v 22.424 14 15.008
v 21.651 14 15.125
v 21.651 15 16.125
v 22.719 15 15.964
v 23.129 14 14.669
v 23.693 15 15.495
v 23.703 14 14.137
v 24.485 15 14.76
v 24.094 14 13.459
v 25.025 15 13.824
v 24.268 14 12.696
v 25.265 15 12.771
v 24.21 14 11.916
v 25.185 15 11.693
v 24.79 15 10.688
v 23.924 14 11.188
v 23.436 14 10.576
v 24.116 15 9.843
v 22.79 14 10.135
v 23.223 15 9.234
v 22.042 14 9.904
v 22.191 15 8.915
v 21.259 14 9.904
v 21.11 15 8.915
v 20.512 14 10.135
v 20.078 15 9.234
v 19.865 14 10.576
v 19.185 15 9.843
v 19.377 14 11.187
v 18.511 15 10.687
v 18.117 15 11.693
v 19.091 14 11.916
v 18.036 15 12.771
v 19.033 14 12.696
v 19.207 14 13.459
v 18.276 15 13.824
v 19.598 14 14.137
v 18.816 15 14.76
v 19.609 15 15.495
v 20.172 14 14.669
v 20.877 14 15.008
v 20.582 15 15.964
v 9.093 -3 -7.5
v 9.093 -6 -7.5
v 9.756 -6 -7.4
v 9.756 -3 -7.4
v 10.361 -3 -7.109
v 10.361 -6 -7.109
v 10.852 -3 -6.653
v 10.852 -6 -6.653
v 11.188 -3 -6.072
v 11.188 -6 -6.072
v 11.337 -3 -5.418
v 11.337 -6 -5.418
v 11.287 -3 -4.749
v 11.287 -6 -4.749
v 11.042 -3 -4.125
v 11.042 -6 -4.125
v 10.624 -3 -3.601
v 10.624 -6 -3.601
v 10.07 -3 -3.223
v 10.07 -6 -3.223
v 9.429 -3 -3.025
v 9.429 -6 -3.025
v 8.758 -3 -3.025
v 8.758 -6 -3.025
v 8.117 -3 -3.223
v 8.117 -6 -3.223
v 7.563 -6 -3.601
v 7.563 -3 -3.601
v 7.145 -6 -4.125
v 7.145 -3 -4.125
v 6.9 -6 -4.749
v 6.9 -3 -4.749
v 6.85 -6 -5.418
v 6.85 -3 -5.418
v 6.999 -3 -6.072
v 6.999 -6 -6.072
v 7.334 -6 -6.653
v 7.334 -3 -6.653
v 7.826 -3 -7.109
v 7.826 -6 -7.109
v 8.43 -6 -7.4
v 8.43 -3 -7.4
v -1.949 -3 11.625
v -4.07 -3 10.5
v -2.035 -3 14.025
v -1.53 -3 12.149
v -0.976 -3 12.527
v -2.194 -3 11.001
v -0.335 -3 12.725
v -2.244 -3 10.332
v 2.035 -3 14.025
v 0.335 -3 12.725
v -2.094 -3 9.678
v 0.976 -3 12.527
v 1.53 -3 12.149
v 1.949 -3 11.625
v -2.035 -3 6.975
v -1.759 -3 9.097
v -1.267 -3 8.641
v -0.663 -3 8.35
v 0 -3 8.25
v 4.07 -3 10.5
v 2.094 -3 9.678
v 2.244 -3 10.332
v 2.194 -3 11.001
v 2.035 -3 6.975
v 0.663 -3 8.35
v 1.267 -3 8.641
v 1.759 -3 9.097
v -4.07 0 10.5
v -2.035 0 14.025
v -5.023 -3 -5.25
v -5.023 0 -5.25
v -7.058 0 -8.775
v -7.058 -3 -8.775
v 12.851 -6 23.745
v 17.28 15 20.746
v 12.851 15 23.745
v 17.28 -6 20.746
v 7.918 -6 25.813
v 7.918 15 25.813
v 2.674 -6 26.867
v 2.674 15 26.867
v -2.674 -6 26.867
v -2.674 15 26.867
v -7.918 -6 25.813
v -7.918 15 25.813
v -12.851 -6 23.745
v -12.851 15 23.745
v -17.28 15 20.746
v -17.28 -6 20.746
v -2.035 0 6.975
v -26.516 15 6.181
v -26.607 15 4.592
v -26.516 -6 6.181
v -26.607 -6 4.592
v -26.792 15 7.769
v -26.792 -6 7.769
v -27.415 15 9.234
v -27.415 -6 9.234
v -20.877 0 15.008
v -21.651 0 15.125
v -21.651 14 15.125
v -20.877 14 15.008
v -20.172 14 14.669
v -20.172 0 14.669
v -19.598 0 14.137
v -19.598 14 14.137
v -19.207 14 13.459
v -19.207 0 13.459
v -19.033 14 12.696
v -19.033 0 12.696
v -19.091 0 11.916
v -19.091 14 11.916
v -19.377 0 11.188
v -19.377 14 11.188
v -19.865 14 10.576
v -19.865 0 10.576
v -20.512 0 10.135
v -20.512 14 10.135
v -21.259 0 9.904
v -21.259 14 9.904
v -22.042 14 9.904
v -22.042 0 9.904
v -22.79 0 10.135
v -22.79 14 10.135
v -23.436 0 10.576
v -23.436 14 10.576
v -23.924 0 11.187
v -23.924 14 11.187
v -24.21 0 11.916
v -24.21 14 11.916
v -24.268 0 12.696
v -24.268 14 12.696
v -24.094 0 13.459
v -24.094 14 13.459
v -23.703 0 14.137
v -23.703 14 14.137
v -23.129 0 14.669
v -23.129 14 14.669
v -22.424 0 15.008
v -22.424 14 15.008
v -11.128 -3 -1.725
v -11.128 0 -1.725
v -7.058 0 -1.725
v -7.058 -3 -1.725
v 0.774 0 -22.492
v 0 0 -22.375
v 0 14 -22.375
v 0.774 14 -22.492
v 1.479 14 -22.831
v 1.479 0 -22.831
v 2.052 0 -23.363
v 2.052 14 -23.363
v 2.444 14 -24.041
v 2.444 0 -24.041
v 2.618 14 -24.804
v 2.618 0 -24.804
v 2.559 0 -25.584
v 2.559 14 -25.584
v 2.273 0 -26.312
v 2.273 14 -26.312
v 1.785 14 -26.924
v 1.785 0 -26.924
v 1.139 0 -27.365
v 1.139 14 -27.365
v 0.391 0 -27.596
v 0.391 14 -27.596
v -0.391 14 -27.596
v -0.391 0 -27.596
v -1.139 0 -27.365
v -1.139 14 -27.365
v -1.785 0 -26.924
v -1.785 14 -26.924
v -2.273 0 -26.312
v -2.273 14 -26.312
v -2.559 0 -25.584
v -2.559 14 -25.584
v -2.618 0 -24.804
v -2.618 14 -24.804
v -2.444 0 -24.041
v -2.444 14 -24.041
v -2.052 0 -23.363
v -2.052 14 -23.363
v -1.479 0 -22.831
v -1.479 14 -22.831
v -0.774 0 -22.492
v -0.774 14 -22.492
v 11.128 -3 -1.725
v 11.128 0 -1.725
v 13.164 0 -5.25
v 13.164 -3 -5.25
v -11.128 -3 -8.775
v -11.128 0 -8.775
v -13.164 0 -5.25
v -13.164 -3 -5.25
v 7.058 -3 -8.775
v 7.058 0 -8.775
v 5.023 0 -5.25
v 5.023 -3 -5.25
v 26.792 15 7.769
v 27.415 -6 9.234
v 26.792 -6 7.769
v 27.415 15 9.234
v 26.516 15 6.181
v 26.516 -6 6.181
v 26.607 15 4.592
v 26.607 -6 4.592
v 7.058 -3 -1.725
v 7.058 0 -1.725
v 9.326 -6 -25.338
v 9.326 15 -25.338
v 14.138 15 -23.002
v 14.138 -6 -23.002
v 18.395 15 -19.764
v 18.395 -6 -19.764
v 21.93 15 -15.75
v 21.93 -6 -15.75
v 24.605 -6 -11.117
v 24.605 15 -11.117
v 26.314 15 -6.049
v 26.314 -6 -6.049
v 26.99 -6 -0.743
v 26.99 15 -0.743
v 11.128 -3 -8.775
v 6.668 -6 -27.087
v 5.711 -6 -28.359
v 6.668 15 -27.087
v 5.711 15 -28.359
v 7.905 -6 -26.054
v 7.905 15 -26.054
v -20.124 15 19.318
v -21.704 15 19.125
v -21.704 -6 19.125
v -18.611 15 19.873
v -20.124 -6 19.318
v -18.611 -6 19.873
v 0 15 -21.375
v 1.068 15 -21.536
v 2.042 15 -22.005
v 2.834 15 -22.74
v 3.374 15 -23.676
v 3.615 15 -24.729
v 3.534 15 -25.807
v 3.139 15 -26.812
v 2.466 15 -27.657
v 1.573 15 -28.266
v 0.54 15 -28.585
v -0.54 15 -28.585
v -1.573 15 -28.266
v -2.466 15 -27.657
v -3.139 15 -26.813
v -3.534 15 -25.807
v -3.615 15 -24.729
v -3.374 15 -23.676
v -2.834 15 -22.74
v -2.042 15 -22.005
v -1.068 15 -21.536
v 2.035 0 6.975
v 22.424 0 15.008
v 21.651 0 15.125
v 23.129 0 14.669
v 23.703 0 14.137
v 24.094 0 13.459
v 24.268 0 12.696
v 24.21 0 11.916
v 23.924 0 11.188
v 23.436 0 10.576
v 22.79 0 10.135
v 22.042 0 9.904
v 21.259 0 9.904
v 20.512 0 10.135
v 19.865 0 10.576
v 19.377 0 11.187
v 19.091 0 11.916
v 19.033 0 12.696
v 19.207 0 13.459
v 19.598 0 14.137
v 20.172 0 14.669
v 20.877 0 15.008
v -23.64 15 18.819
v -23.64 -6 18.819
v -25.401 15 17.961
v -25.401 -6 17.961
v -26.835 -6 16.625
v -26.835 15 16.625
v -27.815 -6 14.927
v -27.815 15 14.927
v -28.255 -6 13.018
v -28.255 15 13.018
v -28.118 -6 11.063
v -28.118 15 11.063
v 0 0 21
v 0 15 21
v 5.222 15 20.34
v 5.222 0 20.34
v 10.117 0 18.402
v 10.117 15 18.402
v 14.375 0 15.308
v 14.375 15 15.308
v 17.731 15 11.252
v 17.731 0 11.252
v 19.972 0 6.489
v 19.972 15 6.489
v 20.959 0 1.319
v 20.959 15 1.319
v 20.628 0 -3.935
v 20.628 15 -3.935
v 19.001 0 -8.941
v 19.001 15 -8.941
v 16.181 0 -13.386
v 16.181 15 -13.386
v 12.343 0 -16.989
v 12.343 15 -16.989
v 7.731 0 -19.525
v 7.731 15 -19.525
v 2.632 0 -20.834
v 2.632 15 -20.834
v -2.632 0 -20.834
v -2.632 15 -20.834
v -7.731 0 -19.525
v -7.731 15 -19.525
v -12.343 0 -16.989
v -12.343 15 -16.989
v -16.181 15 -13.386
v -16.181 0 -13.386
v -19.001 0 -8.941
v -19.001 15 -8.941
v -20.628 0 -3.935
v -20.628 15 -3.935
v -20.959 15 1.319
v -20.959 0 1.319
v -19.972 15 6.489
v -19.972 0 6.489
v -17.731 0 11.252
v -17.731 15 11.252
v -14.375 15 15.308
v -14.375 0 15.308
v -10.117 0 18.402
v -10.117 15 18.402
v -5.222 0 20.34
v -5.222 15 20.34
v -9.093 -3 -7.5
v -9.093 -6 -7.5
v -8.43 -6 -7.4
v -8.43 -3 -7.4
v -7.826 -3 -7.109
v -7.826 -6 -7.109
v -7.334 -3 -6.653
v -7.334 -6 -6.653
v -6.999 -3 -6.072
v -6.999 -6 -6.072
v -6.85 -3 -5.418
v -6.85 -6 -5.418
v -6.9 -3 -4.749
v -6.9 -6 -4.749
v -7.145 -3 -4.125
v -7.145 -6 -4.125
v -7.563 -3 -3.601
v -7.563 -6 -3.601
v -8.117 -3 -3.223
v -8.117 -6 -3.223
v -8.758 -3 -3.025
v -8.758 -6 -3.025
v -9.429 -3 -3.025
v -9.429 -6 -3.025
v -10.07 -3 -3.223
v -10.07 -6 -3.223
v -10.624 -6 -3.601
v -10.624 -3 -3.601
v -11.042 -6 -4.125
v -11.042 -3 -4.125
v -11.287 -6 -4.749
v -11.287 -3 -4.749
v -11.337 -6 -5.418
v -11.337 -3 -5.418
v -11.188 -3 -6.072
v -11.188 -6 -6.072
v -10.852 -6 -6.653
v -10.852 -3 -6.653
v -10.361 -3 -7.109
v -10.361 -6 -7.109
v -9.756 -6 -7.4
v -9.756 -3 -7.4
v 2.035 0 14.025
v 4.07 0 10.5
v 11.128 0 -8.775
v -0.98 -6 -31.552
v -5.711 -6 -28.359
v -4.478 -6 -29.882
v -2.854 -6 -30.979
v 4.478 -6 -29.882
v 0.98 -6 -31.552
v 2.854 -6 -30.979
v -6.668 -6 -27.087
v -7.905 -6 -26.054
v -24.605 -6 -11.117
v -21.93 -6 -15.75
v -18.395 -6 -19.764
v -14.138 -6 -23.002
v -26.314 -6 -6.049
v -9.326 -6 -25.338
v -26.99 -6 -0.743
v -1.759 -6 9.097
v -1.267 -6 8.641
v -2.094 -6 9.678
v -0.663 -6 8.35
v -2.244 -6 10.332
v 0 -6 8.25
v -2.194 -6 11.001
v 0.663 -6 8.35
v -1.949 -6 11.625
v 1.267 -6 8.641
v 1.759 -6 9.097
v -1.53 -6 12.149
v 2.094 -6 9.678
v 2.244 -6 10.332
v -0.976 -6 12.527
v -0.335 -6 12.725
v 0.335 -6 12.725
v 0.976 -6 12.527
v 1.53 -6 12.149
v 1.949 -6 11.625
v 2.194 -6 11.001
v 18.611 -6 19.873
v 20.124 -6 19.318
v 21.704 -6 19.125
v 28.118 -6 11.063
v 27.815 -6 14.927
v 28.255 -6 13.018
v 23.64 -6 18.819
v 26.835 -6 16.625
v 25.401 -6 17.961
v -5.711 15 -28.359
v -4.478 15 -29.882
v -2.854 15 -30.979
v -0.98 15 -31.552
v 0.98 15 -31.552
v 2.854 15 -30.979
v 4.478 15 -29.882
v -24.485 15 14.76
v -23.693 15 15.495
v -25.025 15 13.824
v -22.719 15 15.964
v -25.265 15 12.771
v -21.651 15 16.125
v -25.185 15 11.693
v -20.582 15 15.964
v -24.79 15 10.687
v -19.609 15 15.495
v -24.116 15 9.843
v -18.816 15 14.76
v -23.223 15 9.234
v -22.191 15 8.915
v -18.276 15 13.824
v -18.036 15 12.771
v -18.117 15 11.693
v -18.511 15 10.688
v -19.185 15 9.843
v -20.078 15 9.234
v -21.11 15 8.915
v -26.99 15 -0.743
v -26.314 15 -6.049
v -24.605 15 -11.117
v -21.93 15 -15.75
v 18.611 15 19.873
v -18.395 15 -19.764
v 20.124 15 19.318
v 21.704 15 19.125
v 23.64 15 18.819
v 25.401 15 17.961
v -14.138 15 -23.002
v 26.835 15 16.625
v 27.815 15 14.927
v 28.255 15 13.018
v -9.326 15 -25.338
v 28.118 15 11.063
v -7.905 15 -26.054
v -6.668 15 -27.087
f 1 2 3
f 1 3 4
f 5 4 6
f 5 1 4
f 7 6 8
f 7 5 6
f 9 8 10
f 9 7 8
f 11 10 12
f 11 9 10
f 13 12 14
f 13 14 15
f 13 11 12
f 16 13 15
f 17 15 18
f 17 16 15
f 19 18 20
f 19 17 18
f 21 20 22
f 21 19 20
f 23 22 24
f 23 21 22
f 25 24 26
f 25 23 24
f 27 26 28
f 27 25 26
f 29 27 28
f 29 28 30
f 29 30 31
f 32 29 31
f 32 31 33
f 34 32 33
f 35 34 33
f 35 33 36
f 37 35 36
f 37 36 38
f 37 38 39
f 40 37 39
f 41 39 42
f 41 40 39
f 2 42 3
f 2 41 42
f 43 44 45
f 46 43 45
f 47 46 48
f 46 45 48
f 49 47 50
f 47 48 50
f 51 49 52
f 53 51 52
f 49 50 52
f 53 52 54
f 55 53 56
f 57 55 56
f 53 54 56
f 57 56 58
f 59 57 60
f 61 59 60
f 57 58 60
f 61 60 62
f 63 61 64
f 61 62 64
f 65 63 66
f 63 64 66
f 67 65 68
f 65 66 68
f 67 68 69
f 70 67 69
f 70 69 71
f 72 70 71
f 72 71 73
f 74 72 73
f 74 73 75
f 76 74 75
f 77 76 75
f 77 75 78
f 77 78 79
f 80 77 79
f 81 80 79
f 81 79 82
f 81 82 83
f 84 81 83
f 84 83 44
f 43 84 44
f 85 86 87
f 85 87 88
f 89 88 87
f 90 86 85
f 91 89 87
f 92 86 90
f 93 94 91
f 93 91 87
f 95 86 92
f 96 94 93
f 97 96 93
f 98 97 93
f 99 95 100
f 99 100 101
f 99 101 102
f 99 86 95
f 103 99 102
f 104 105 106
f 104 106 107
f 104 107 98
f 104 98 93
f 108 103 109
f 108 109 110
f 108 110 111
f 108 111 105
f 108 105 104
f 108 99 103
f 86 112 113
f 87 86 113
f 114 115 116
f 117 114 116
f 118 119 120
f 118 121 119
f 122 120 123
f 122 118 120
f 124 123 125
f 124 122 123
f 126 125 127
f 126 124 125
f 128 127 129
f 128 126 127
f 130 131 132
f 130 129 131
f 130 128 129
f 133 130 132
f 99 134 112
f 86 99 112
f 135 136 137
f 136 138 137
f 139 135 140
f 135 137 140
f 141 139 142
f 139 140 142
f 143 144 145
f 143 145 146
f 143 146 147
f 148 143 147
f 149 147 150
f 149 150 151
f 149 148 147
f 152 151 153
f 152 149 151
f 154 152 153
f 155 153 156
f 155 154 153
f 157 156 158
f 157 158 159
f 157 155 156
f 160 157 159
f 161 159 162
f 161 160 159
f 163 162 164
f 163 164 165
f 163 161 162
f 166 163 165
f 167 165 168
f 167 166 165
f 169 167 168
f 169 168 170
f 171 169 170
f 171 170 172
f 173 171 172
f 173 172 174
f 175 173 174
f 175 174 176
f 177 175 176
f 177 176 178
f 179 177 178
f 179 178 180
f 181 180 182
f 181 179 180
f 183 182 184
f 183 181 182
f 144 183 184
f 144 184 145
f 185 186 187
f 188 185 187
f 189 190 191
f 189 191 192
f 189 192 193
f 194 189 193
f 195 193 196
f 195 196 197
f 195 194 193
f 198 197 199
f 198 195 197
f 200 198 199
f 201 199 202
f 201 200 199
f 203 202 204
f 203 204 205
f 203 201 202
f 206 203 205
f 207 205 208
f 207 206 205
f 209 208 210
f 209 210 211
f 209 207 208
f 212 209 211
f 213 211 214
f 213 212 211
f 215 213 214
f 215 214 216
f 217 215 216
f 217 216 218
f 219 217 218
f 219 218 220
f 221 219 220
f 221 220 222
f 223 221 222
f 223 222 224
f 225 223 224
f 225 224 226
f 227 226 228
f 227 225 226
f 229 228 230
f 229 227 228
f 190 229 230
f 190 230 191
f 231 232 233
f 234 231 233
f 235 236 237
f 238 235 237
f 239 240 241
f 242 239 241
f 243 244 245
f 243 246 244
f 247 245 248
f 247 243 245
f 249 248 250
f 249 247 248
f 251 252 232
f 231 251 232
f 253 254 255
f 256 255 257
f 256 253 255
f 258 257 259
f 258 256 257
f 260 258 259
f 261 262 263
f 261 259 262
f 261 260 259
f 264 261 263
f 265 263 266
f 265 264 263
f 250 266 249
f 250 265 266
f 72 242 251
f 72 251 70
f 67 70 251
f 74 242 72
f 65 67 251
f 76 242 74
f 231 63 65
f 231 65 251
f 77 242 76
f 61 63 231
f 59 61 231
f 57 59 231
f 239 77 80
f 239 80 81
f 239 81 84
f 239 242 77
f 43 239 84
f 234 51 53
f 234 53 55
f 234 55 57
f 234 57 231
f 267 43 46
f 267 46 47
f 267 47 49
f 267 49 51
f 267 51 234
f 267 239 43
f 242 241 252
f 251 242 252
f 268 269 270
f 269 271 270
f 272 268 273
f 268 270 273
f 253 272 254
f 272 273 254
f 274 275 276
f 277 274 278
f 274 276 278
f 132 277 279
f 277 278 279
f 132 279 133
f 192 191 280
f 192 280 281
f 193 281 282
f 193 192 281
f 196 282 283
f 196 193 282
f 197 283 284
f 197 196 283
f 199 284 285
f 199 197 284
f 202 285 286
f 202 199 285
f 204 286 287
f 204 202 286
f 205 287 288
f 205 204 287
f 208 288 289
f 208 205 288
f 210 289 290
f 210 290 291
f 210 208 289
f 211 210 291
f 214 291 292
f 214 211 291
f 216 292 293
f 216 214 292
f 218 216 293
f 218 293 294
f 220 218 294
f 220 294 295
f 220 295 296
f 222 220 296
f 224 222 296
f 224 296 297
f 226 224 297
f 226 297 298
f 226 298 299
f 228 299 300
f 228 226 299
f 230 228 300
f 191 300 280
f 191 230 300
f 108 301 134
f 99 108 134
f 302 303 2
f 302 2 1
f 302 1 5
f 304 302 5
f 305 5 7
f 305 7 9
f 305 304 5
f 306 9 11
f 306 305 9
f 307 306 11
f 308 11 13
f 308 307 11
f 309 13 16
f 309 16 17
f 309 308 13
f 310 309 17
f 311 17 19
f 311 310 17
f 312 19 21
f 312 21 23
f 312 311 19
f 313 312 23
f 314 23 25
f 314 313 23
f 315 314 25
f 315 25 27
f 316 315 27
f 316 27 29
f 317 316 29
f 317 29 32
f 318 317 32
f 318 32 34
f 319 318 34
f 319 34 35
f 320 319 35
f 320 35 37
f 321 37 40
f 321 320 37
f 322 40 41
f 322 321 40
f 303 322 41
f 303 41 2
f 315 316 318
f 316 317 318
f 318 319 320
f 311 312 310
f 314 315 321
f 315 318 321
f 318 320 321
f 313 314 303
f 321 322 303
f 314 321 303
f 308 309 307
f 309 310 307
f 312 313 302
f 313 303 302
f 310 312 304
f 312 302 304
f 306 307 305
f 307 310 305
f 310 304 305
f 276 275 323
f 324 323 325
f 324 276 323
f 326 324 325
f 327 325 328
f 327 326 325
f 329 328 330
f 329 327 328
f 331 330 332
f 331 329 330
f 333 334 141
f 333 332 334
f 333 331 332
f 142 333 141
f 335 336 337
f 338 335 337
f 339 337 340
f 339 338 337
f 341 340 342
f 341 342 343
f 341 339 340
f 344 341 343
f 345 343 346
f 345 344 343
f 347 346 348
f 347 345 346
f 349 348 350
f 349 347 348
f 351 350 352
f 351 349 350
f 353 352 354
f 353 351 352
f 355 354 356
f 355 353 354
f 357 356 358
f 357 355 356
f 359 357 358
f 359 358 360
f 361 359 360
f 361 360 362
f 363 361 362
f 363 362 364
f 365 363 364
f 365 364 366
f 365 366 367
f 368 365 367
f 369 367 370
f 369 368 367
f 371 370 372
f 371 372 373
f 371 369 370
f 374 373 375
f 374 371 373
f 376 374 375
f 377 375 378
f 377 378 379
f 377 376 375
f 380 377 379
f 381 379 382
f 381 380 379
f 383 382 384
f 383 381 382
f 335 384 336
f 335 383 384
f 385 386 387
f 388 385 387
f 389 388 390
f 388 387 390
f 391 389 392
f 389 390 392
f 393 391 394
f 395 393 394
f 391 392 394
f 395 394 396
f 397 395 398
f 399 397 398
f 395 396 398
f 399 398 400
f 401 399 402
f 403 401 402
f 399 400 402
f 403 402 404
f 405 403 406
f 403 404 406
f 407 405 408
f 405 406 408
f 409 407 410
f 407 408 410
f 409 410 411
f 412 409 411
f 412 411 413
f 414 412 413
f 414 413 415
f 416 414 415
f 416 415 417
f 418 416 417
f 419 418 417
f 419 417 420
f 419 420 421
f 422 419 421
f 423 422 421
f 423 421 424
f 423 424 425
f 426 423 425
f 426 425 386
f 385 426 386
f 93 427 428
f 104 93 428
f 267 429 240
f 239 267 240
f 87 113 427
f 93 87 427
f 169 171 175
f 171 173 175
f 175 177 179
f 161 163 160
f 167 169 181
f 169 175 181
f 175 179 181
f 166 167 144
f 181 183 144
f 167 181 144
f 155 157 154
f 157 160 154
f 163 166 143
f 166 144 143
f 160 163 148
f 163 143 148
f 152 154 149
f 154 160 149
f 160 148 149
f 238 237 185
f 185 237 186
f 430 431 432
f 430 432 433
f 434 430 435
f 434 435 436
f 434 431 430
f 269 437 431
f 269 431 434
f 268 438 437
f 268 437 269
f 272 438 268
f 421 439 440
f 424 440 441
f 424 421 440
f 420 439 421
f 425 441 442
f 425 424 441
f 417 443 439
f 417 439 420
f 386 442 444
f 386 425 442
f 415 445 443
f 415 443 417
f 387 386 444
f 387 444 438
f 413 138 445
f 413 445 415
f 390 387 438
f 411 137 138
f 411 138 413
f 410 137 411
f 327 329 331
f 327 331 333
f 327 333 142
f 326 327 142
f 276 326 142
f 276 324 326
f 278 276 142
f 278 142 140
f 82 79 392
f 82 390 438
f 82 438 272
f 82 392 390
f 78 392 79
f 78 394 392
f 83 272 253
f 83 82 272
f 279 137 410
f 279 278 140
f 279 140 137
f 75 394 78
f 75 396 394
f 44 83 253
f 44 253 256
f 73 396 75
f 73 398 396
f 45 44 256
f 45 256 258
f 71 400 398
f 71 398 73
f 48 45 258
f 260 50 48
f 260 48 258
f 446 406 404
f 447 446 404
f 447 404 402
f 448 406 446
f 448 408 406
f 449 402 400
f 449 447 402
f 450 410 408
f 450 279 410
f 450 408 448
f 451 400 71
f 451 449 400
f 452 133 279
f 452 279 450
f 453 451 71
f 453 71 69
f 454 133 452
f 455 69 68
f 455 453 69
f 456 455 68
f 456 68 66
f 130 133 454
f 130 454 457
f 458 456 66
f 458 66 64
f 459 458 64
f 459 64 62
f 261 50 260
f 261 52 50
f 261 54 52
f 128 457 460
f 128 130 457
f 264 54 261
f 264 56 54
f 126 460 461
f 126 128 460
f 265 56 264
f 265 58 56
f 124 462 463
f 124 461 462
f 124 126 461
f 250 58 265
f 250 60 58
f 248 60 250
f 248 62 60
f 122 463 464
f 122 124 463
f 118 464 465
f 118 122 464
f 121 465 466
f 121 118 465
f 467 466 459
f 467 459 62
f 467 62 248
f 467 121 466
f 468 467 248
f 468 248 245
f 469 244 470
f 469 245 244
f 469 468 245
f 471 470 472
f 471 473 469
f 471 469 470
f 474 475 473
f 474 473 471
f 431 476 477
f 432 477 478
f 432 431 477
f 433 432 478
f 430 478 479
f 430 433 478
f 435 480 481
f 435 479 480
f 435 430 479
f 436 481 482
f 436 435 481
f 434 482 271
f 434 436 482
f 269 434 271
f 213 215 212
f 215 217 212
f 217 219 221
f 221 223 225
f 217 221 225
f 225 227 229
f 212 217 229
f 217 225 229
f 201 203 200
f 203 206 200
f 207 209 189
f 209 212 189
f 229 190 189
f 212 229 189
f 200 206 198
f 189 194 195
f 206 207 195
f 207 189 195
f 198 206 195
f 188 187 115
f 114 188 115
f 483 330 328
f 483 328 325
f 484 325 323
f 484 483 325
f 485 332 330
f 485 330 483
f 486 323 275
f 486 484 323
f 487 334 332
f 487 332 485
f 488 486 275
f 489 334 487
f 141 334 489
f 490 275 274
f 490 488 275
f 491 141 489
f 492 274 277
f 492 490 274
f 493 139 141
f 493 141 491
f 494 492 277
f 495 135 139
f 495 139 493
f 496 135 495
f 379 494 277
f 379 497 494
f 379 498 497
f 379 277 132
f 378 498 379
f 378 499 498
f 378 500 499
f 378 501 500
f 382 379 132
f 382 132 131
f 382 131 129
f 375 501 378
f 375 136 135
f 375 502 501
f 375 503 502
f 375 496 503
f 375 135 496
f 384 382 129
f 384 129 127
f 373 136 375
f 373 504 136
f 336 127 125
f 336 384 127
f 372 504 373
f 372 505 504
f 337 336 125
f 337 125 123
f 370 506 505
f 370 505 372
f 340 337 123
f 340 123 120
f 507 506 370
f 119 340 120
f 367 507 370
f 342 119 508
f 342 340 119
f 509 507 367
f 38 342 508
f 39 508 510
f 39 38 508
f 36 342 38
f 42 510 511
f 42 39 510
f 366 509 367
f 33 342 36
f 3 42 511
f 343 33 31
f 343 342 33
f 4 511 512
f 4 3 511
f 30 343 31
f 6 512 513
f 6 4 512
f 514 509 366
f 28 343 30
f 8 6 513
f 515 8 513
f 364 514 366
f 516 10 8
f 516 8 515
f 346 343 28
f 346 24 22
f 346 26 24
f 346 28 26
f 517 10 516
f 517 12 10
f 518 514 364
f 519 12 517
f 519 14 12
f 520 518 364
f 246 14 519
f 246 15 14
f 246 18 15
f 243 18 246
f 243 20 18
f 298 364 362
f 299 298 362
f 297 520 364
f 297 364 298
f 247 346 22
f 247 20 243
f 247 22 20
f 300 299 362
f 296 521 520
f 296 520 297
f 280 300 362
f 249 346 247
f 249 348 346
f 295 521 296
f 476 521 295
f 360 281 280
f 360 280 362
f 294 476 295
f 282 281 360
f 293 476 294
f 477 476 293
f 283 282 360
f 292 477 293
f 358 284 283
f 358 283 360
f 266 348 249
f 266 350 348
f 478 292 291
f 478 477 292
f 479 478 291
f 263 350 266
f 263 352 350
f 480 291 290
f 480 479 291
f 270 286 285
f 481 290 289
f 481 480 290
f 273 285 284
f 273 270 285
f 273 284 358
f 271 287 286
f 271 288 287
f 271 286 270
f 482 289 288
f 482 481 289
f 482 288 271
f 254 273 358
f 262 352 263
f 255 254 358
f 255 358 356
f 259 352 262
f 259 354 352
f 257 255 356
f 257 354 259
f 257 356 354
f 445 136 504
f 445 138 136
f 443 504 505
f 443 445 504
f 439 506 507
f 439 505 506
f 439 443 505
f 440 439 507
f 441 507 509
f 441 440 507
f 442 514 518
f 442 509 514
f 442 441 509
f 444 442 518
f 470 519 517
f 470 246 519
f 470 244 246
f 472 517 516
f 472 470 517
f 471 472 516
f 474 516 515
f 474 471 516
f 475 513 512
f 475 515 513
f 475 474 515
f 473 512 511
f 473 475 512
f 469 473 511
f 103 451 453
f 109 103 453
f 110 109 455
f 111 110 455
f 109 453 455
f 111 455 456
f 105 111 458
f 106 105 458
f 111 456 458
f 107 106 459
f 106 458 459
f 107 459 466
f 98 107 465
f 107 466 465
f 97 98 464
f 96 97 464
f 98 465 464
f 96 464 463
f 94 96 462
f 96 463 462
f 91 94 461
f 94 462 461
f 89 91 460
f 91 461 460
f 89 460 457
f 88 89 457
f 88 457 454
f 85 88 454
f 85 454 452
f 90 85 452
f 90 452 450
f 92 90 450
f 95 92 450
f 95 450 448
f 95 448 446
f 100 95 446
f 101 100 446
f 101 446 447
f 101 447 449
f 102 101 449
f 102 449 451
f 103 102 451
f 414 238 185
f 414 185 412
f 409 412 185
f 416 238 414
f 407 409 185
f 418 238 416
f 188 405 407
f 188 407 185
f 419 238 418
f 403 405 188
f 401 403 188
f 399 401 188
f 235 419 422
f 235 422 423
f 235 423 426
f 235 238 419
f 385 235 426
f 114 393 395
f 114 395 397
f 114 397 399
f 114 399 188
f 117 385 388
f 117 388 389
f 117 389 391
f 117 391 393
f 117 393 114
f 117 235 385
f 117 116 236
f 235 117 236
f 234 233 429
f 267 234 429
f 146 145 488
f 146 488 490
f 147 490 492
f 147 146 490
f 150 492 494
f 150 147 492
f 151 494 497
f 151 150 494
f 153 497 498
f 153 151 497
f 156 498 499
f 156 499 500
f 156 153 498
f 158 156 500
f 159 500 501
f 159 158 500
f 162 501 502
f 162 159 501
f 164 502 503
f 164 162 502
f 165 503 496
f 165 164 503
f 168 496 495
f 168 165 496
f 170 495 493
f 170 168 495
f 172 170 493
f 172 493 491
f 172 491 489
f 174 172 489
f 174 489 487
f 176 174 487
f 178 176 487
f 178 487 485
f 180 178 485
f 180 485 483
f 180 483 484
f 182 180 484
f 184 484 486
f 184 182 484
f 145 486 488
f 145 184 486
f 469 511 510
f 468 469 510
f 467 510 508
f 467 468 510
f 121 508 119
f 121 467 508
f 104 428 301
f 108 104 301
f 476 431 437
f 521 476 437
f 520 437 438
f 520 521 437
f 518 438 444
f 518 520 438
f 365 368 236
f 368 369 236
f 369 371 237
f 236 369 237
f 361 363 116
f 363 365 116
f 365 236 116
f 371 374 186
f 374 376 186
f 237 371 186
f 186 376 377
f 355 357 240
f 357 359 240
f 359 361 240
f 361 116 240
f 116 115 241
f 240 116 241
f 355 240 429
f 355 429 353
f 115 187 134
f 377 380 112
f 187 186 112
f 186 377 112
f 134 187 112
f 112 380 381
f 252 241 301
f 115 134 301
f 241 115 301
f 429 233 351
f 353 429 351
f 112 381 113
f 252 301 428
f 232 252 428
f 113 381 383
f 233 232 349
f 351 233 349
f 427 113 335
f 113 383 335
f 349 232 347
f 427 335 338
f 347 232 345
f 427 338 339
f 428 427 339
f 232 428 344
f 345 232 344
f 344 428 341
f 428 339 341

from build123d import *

# Parameters (mm, degrees)
SKETCH_1_R          = 2.625
SKETCH_1_R_2        = 21
EXTRUDE_1_DEPTH     = 15
EXTRUDE_START       = 6
EXTRUDE_2_DEPTH     = 6
FILLET_1_R          = 7
CHAMFER_1_SIZE      = 1
SKETCH_3_R          = 2.25
CUT_EXTRUDE_1_DEPTH = 48.335527685
CUT_EXTRUDE_2_DEPTH = 3


with BuildPart() as part:
    # Эскиз1 → Бобышка-Вытянуть1 (new body)
    with BuildSketch(Plane(origin=(0, 0, 0), x_dir=(1, 0, 0), z_dir=(0, 1, 0))):
        with BuildLine():
            ThreePointArc((25.949265582, -7.458928593), (23.382685902, 13.5), (6.515011145, 26.2021875))
            ThreePointArc((6.515011145, 26.2021875), (0, 31.625), (-6.515011145, 26.2021875))
            ThreePointArc((-6.515011145, 26.2021875), (-23.382685902, 13.5), (-25.949265582, -7.458928593))
            ThreePointArc((-25.949265582, -7.458928593), (-27.388053395, -15.8125), (-19.434254437, -18.743258907))
            ThreePointArc((-19.434254437, -18.743258907), (0, -27), (19.434254437, -18.743258907))
            ThreePointArc((19.434254437, -18.743258907), (27.388053395, -15.8125), (25.949265582, -7.458928593))
        make_face()
        with Locations(Location((0, 25, 0), (0, 0, 270))):
            Circle(SKETCH_1_R, mode=Mode.SUBTRACT)
        with Locations(Location((0, 0, 0), (0, 0, 270))):
            Circle(SKETCH_1_R_2, mode=Mode.SUBTRACT)
        with Locations(Location((-21.650635095, -12.5, 0), (0, 0, 270))):
            Circle(SKETCH_1_R, mode=Mode.SUBTRACT)
        with Locations(Location((21.650635095, -12.5, 0), (0, 0, 270))):
            Circle(SKETCH_1_R, mode=Mode.SUBTRACT)
    extrude(amount=EXTRUDE_1_DEPTH)

    # Эскиз2 → Бобышка-Вытянуть2 (add)
    with BuildSketch(Plane.XZ.offset(EXTRUDE_START)):
        with BuildLine():
            ThreePointArc((25.949265582, 7.458928593), (27.388053395, 15.8125), (19.434254437, 18.743258907))
            ThreePointArc((19.434254437, 18.743258907), (0, 27), (-19.434254437, 18.743258907))
            ThreePointArc((-19.434254437, 18.743258907), (-27.388053395, 15.8125), (-25.949265582, 7.458928593))
            ThreePointArc((-25.949265582, 7.458928593), (-23.382685902, -13.5), (-6.515011145, -26.2021875))
            ThreePointArc((-6.515011145, -26.2021875), (0, -31.625), (6.515011145, -26.2021875))
            ThreePointArc((6.515011145, -26.2021875), (23.382685902, -13.5), (25.949265582, 7.458928593))
        make_face()
    extrude(amount=-EXTRUDE_2_DEPTH)

    # Скругление1
    fillet_1_edges = [part.edges().sort_by_distance(p)[0] for p in [
        (19.434254437, 4.5, 18.743258907),
        (-19.434254437, 4.5, 18.743258907),
        (-25.949265582, 4.5, 7.458928593),
        (-6.515011145, 4.5, -26.2021875),
        (6.515011145, 4.5, -26.2021875),
        (25.949265582, 4.5, 7.458928593),
    ]]
    fillet(fillet_1_edges, radius=FILLET_1_R)

    # Фаска1
    chamfer_1_edges = [part.edges().sort_by_distance(p)[0] for p in [
        (21.650635095, 15, 9.875),
        (0, 15, -27.625),
        (-21.650635095, 15, 9.875),
    ]]
    chamfer(chamfer_1_edges, length=CHAMFER_1_SIZE)

    # Эскиз3 → Вырез-Вытянуть1 (cut, through all)
    with BuildSketch(Plane.XZ.offset(6)):
        with Locations(Location((0, 10.5, 0), (0, 0, 270))):
            Circle(SKETCH_3_R)
        with Locations(Location((9.09326674, -5.25, 0), (0, 0, 270))):
            Circle(SKETCH_3_R)
        with Locations(Location((-9.09326674, -5.25, 0), (0, 0, 270))):
            Circle(SKETCH_3_R)
    extrude(amount=-CUT_EXTRUDE_1_DEPTH, mode=Mode.SUBTRACT)

    # Эскиз4 → Вырез-Вытянуть2 (cut)
    with BuildSketch(Plane(origin=(0, 0, 0), x_dir=(1, 0, 0), z_dir=(0, 1, 0))):
        Polygon((-4.070319398, -10.5), (-2.035159699, -14.025), (2.035159699, -14.025), (4.070319398, -10.5), (2.035159699, -6.975), (-2.035159699, -6.975), align=None)
        Polygon((11.128426439, 1.725), (13.163586138, 5.25), (11.128426439, 8.775), (7.058107041, 8.775), (5.022947342, 5.25), (7.058107041, 1.725), align=None)
        Polygon((-7.058107041, 8.775), (-11.128426439, 8.775), (-13.163586138, 5.25), (-11.128426439, 1.725), (-7.058107041, 1.725), (-5.022947342, 5.25), align=None)
    extrude(amount=-CUT_EXTRUDE_2_DEPTH, mode=Mode.SUBTRACT)


solid = part.part
